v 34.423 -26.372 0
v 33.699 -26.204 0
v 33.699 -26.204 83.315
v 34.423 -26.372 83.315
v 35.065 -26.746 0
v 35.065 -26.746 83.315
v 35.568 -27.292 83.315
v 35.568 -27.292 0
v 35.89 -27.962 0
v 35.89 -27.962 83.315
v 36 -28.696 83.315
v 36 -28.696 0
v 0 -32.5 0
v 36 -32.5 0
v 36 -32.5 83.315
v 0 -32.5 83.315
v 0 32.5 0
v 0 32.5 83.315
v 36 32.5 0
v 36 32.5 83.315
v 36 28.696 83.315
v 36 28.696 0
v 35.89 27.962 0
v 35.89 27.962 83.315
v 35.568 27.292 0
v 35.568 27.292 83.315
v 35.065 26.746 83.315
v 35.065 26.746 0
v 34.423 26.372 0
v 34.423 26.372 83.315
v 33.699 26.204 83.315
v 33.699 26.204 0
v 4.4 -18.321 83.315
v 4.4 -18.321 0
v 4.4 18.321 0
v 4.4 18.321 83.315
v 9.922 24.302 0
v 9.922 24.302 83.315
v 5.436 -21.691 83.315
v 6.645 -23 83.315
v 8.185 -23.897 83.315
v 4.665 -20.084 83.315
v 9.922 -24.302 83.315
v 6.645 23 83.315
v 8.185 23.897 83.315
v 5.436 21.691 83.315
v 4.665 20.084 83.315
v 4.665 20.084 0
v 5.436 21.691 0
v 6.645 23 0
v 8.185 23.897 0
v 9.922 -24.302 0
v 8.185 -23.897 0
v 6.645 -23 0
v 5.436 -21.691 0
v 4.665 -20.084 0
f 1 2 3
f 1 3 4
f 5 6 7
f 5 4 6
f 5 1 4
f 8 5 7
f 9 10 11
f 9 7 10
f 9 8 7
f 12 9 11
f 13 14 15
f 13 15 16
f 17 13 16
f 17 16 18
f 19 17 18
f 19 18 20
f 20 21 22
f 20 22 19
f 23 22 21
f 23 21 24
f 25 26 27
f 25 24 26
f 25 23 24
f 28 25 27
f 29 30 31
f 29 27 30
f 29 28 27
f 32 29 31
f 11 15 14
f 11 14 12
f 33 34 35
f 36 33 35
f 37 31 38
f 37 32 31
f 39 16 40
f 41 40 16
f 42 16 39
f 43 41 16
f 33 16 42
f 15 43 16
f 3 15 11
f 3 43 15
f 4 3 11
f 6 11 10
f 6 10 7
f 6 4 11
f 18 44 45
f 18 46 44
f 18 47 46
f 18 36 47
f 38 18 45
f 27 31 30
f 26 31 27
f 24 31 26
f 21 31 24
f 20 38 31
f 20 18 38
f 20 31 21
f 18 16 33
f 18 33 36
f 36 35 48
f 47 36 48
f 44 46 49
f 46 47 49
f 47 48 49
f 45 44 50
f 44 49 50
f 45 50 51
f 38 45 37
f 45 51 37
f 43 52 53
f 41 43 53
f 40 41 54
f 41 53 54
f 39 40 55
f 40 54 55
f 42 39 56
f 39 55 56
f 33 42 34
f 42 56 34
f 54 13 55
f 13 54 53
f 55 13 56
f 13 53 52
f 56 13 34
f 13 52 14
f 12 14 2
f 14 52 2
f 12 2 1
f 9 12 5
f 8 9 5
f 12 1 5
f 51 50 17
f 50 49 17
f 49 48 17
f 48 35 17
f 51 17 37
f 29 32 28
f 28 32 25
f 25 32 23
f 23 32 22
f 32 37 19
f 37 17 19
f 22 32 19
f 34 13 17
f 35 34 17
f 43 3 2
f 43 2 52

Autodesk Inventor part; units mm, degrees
ref_plane "Начальная плоскость" through (0, 0, 0) normal (0, 0, 1) x (1, 0, 0)
ref_plane "Конечная плоскость" through (0, 0, 83.315) normal (0, 0, 1) x (1, 0, 0)
sketch "Эскиз" plane through (0, 0, 0) normal (0, 0, 1) x (1, 0, 0)
  line L0 (36, -32.5) -> (0, -32.5)
  line L1 (36, -32.5) -> (36, -28.696)
  line L2 (33.6994, -26.2039) -> (9.9215, -24.3017)
  line L3 (4.4, -18.3208) -> (4.4, 18.3208)
  line L4 (33.6994, 26.2039) -> (9.9215, 24.3017)
  line L5 (36, 28.696) -> (36, 32.5)
  line L6 (0, 32.5) -> (36, 32.5)
  line L7 (0, -32.5) -> (0, 32.5)
  arc A0 (4.4, -18.3208) -> (9.9215, -24.3017) centre (10.4, -18.3208) ccw
  arc A1 (9.9215, 24.3017) -> (4.4, 18.3208) centre (10.4, 18.3208) ccw
  arc A2 (36, -28.696) -> (33.6994, -26.2039) centre (33.5, -28.696) ccw
  arc A3 (33.6994, 26.2039) -> (36, 28.696) centre (33.5, 28.696) ccw
  line L8 (0, 45.5) -> (0, -45.5) construction
  line L9 (-7.2974, 0) -> (43.7847, 0) construction
  point P0 (36, -26.388)
  point P1 (4.4, -23.86)
  point P2 (4.4, 23.86)
  point P3 (36, 26.388)
  dimension "d3" = 36
  dimension "d5" = 4.4
  dimension "d7" = 65
  dimension "d9" = 8.64
  dimension "d11" = 8.64
  dimension "d13" = 6.112
  dimension "d15" = 6.112
  dimension "d22" = 6
  dimension "d23" = 2.5
  dimension "d24" = 32.5
  dimension "d25" = 0
extrude "Тело" add sketch "Эскиз" along normal up to surface (83.315 mm away) from surface at 0
sketch "Sketch3" plane through (0, 0, 0) normal (0, 0, 1) x (1, 0, 0)
  line L0 (0, 0) -> (10, 0)
ref_plane "Work Plane7" through (0, 0, 0) normal (0, -1, 0) x (1, 0, 0)
sketch "Sketch4" plane through (0, 0, 0) normal (0, -1, 0) x (1, 0, 0)
  line L0 (-2, 0) -> (12, 0)
  line L1 (-2, 83.315) -> (12, 83.315)
  dimension "d29" = 83.315
ref_plane "РабПлоскость8" through (18, -177.5, 83.315) normal (0, 0, 1) x (1, 0, 0)
split "Разделение1" plane through (18, -177.5, 83.315) removes the side toward (0, 0, 1)
equation "\"d3\" = b"
equation "\"d5\" = t1"
equation "\"d7\" = ParH"
equation "\"d9\" = msp_x1 + t2"
equation "\"d11\" = msp_x1 + t2"
equation "\"d13\" = -msp_x2 + t2"
equation "\"d15\" = -msp_x2 + t2"
equation "\"d22\" = R"
equation "\"d23\" = R1"
equation "\"d24\" = 0.5 * d7"
equation "\"d16\" = G_L"
equation "\"R1\" = 2.5"
equation "\"R\" = 6"
equation "\"t1\" = 4.4"
equation "\"t2\" = 7.2"
equation "\"ParH\" = 65"
equation "\"b\" = 36"
equation "\"msp_x1\" = 0.04 * b"
equation "\"msp_x2\" = -0.08 * t1 + 0.04 * b"
equation "\"G_L\" = d29"
equation "\"ex\" = 0"
equation "\"G_OFFSET_START\" = 0"
equation "\"G_OFFSET_END\" = 0"
equation "\"d27\" = G_OFFSET_END + B_L"
equation "\"B_L\" = 83.315"
properties part number "Швеллер 6.5U-83,32 ГОСТ 8240-97" material "Сталь, мягкая, сварочная"
